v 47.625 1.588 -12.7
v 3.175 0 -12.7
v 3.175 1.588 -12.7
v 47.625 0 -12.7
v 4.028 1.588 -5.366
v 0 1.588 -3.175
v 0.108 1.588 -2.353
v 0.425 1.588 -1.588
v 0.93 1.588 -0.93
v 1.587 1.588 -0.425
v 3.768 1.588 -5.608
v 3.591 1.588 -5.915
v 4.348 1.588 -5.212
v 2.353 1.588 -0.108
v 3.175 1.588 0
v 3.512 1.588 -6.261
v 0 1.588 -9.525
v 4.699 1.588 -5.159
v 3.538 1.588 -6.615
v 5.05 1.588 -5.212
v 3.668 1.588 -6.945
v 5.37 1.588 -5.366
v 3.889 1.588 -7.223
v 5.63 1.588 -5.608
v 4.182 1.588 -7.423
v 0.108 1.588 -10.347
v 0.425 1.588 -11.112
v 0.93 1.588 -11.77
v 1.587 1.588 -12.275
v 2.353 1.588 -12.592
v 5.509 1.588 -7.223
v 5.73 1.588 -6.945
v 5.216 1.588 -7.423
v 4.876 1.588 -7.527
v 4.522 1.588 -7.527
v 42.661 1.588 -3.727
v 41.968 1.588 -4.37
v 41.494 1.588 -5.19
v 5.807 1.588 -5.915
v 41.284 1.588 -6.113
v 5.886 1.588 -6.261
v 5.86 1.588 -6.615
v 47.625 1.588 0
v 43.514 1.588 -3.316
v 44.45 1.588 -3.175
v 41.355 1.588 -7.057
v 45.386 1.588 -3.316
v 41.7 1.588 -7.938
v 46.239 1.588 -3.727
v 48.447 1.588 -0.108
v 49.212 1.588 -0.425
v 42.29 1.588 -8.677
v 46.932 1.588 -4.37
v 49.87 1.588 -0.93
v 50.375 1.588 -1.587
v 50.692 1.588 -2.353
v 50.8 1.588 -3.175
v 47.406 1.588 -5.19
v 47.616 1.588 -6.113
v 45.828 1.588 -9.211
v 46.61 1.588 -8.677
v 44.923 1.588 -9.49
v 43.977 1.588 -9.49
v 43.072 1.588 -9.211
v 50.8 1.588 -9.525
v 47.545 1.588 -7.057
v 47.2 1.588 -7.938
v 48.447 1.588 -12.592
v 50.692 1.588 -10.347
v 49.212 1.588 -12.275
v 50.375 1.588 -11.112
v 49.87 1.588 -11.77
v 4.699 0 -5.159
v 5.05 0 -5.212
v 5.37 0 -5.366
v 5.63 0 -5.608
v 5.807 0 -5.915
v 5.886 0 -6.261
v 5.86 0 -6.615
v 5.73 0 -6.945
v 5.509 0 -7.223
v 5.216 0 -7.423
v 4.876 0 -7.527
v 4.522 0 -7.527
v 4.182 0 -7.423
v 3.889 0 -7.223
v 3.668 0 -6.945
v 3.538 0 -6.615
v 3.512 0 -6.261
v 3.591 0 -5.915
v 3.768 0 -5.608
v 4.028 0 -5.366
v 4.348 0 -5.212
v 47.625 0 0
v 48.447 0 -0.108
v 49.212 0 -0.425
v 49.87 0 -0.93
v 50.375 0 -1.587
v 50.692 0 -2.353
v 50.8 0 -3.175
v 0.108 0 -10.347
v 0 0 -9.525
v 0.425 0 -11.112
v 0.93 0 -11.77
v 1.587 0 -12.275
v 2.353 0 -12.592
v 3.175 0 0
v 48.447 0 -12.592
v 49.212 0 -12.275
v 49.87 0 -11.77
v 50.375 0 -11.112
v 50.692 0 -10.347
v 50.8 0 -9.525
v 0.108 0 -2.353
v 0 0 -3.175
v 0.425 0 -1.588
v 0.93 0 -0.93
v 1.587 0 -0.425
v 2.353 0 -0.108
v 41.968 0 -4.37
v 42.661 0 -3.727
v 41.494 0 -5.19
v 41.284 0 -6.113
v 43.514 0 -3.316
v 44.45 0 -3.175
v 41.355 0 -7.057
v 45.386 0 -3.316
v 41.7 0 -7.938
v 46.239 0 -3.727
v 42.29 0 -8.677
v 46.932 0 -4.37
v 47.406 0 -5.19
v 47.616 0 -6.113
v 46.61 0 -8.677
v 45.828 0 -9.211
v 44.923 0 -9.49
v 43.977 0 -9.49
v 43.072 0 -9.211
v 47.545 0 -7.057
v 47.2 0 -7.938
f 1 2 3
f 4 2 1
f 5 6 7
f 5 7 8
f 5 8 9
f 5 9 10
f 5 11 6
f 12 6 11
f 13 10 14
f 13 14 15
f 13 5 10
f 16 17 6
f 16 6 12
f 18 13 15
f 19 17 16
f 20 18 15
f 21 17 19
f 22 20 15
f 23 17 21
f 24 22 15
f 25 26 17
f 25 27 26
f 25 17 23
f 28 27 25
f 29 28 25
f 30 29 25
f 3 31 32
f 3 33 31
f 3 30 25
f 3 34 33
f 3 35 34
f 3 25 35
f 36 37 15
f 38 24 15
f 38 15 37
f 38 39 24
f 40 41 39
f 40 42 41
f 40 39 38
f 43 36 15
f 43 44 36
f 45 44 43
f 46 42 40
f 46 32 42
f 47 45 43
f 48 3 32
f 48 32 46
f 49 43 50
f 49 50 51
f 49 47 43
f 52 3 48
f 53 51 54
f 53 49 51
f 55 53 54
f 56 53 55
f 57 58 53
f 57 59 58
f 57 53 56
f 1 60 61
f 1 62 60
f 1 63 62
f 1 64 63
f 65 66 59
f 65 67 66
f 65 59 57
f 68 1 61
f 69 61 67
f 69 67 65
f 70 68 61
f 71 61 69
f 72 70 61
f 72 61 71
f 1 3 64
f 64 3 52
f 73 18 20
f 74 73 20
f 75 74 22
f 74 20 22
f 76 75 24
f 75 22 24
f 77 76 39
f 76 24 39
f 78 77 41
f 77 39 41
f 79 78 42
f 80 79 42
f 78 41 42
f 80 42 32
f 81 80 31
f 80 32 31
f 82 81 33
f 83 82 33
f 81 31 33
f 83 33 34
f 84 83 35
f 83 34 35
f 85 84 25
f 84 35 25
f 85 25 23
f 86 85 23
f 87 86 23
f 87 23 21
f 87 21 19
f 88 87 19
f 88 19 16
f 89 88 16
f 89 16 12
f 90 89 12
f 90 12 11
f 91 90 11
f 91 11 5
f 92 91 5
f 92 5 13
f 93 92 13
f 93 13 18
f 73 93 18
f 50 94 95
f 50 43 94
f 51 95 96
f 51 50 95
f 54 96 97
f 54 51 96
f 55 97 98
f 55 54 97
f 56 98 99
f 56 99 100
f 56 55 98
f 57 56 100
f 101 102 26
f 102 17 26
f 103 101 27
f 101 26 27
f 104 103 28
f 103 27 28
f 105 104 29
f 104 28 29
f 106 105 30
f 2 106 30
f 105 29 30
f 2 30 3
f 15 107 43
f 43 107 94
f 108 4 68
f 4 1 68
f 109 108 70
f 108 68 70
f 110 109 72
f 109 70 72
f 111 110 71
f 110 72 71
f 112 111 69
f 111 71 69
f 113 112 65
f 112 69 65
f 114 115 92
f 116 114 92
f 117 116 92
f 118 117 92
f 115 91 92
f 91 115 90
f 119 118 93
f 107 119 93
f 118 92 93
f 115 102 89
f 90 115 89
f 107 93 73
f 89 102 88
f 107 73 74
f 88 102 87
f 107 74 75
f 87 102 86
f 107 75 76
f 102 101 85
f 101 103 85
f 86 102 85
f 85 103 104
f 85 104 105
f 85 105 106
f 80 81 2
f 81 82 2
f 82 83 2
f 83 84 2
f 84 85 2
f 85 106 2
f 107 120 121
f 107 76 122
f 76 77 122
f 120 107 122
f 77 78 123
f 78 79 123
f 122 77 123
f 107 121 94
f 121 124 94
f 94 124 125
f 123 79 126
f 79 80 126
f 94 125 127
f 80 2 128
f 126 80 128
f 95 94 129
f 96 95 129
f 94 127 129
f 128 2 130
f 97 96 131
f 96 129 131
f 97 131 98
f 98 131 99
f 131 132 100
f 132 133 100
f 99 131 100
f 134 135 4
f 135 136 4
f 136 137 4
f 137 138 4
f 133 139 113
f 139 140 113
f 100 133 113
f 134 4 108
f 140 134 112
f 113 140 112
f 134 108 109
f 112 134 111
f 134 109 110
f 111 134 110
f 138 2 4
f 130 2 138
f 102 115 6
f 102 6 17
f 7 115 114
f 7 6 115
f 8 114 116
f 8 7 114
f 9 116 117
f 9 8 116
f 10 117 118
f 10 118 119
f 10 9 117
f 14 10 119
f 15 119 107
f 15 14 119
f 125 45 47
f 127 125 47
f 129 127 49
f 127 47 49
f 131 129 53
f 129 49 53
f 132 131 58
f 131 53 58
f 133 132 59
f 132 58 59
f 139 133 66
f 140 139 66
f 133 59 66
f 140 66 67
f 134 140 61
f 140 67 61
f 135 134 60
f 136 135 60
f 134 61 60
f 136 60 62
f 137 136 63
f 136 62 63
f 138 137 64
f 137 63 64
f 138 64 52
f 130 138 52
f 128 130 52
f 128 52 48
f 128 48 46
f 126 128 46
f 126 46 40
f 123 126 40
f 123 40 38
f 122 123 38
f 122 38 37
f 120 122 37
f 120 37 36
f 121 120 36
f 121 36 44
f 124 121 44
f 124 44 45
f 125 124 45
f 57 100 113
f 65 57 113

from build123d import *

# Parameters (mm, degrees)
SKETCH1_W           = 50.8
SKETCH1_H           = 12.7
BOSS_EXTRUDE1_DEPTH = 1.5875
SKETCH2_R           = 1.190625
SKETCH2_R_2         = 3.175
CUT_EXTRUDE1_DEPTH  = 53.3875
FILLET1_R           = 3.175


with BuildPart() as part:
    # Sketch1 → Boss-Extrude1 (new body)
    with BuildSketch(Plane(origin=(0, 0, 0), x_dir=(1, 0, 0), z_dir=(0, 1, 0))):
        with Locations((25.4, 6.35)):
            Rectangle(SKETCH1_W, SKETCH1_H)
    extrude(amount=BOSS_EXTRUDE1_DEPTH)

    # Sketch2 → Cut-Extrude1 (cut, through all)
    with BuildSketch(Plane(origin=(0, 1.5875, 0), x_dir=(1, 0, 0), z_dir=(0, 1, 0))):
        with Locations(Location((4.699, 6.35, 0), (0, 0, 270))):
            Circle(SKETCH2_R)
        with Locations(Location((44.45, 6.35, 0), (0, 0, 270))):
            Circle(SKETCH2_R_2)
    extrude(amount=-CUT_EXTRUDE1_DEPTH, mode=Mode.SUBTRACT)

    # Fillet1
    fillet1_edges = [part.edges().sort_by_distance(p)[0] for p in [
        (0, 0.79375, -12.7),
        (50.8, 0.79375, -12.7),
        (50.8, 0.79375, 0),
        (0, 0.79375, 0),
    ]]
    fillet(fillet1_edges, radius=FILLET1_R)


solid = part.part
